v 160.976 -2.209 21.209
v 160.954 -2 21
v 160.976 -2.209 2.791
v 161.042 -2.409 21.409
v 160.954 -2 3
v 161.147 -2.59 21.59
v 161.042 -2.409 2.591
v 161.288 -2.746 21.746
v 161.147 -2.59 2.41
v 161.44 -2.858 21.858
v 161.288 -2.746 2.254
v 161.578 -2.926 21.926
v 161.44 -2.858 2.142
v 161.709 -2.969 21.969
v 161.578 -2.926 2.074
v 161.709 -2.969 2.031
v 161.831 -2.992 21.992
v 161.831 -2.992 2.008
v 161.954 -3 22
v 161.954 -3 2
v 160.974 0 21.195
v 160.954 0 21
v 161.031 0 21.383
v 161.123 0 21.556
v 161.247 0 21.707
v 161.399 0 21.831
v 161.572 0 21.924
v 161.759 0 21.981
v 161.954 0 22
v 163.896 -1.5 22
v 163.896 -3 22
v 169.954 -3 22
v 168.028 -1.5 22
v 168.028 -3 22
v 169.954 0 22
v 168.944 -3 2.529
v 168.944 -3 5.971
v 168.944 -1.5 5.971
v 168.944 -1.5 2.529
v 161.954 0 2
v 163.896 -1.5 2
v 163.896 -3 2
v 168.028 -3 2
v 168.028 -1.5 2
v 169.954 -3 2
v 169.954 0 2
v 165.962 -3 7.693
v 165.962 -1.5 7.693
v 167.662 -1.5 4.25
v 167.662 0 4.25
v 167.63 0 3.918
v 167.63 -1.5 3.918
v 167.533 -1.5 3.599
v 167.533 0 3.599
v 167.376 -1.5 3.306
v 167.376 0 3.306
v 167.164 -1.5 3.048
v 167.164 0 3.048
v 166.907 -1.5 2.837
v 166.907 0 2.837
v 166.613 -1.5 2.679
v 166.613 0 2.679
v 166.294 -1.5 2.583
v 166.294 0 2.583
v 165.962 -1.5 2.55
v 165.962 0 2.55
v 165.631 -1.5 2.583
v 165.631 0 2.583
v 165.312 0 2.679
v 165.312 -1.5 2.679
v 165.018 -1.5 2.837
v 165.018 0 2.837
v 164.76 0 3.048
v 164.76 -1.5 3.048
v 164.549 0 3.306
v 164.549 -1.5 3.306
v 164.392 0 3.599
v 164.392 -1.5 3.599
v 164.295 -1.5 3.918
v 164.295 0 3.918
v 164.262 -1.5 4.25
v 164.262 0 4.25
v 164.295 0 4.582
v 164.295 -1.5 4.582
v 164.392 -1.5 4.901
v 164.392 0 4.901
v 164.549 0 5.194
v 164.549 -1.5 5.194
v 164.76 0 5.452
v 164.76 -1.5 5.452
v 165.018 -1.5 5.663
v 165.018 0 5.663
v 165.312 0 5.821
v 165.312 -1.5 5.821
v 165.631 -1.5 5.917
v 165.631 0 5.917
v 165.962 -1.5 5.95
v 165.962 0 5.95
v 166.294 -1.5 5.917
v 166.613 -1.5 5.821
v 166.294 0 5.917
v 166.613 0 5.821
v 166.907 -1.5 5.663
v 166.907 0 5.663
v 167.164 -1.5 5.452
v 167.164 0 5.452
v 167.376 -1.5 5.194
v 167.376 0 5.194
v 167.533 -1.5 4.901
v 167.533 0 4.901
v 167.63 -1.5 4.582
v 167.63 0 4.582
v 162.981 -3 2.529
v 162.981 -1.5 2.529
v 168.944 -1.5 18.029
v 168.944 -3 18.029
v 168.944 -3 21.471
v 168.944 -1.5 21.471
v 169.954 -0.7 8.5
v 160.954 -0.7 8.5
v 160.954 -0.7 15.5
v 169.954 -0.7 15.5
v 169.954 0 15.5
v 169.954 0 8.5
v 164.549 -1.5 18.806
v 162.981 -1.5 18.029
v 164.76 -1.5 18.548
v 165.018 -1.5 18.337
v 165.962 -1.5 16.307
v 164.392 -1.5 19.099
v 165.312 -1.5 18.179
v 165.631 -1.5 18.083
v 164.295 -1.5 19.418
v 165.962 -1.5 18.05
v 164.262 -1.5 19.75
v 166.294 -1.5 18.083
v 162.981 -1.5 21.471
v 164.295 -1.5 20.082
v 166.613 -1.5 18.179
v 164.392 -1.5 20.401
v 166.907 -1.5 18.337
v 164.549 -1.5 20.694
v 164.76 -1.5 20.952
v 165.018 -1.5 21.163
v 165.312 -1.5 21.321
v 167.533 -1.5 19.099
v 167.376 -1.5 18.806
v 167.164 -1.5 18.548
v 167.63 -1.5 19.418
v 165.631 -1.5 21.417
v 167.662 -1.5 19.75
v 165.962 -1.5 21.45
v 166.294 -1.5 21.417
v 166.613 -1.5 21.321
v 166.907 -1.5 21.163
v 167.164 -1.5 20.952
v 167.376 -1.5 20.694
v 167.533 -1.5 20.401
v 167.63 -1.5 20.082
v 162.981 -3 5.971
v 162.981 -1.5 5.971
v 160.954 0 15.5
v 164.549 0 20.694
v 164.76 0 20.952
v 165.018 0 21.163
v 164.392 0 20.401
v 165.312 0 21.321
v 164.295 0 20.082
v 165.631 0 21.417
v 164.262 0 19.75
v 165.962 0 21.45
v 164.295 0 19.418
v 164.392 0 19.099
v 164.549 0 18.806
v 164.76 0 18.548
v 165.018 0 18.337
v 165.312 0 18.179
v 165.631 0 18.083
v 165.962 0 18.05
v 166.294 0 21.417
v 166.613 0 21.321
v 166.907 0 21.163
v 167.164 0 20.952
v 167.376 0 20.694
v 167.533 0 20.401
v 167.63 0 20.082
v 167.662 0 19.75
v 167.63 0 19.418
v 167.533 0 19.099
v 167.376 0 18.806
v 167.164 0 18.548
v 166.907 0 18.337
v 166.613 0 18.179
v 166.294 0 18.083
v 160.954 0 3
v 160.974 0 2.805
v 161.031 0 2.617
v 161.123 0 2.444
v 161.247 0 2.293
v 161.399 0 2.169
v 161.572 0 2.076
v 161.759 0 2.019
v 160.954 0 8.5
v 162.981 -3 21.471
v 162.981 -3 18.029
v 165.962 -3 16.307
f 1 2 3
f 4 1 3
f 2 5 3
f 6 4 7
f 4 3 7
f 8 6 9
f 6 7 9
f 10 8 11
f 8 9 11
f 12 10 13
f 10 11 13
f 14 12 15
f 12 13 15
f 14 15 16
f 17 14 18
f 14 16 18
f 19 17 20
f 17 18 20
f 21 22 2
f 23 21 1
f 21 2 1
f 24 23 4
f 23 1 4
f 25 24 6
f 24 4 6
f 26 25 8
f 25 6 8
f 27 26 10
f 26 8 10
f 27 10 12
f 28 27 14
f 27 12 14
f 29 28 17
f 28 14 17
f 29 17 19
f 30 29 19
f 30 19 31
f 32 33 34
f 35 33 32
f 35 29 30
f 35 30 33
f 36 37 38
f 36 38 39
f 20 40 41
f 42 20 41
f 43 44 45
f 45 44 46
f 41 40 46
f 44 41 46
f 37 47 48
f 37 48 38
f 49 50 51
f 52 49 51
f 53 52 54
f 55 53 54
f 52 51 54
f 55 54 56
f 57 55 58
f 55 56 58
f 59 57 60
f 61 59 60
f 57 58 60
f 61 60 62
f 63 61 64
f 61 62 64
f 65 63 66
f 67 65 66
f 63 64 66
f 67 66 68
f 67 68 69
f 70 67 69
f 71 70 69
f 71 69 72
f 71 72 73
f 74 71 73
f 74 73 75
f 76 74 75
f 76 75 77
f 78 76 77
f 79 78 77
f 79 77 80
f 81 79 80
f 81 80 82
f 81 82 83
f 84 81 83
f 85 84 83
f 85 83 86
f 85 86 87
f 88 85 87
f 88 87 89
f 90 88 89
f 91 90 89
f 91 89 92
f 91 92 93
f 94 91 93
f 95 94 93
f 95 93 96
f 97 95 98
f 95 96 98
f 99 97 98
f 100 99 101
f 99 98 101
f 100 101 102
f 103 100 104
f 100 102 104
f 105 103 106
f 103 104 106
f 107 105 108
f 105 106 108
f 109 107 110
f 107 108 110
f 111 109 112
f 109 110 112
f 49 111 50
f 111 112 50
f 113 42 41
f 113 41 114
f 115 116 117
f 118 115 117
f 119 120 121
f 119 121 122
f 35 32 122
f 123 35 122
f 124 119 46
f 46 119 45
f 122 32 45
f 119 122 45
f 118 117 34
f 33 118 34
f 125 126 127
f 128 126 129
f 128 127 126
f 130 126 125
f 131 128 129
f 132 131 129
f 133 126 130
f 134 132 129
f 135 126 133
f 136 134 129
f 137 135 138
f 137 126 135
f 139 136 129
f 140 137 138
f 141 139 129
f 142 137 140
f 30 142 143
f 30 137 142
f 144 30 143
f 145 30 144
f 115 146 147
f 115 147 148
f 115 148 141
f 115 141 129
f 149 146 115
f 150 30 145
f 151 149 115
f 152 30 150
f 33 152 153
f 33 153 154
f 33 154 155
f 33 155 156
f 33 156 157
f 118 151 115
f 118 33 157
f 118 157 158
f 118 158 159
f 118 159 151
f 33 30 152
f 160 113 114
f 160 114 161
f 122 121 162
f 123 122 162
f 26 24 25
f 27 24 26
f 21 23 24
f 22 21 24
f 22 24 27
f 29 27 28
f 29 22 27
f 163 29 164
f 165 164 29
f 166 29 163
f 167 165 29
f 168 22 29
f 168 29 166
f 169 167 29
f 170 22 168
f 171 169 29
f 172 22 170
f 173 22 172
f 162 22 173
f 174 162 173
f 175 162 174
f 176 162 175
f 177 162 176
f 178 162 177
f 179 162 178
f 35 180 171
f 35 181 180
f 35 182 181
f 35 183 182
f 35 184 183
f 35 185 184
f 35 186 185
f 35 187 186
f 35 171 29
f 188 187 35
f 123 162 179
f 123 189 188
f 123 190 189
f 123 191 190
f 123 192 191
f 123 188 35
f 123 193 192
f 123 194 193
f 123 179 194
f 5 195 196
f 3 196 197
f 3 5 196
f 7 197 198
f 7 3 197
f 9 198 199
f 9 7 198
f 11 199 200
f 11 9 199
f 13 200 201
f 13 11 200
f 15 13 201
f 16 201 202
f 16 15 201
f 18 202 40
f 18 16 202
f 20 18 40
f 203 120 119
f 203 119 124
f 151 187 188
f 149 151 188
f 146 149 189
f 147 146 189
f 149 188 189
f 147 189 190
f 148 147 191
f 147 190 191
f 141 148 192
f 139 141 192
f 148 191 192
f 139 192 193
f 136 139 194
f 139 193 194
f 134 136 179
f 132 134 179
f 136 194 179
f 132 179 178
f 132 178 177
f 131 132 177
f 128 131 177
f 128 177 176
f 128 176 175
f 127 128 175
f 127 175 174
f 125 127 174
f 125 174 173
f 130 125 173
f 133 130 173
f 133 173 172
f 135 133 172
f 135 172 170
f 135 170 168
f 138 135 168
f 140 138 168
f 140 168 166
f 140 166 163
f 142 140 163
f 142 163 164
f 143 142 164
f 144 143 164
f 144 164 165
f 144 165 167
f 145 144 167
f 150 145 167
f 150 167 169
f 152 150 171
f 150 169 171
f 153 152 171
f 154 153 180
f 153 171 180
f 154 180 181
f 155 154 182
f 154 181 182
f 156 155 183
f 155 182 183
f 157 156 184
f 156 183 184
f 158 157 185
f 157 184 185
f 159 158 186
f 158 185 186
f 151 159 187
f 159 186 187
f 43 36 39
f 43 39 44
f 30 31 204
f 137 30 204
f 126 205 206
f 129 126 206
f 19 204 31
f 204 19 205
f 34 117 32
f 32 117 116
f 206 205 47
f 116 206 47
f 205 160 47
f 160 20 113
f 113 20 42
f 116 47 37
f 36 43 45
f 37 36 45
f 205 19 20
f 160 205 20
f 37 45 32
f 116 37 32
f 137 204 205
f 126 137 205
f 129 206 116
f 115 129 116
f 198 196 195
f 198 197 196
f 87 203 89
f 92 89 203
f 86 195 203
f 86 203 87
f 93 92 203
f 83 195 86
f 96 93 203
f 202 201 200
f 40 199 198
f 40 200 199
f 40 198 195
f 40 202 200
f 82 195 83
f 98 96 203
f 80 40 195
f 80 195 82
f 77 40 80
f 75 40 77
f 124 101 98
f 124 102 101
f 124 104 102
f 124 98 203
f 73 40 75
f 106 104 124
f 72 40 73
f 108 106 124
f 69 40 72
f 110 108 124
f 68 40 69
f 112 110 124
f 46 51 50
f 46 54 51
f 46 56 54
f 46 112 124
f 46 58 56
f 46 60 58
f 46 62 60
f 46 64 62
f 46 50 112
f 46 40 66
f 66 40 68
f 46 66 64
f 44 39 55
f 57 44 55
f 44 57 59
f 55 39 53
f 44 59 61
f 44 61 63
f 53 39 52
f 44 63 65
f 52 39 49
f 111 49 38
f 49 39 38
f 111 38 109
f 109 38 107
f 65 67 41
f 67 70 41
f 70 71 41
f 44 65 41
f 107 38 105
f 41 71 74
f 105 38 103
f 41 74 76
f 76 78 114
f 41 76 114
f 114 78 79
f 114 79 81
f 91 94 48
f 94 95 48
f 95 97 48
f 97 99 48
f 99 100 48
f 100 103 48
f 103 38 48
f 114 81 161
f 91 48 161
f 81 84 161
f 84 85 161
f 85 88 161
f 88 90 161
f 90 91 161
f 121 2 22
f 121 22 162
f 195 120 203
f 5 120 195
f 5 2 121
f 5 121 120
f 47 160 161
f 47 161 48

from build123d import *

# Parameters (mm, degrees)
CROQUIS1_W              = 9
CROQUIS1_H              = 20
CROQUIS1_R              = 1.7
SALIENTE_EXTRUIR1_DEPTH = 3
CORTAR_EXTRUIR2_DEPTH   = 1.5
CORTAR_EXTRUIR3_REACH   = 11
CROQUIS3_W              = 7
CROQUIS3_H              = 1
REDONDEO1_R             = 1
CROQUIS4_W              = 9
CROQUIS4_H              = 7
SALIENTE_EXTRUIR2_DEPTH = 0.3


with BuildPart() as part:
    # Croquis1 → Saliente-Extruir1 (new body)
    with BuildSketch(Plane(origin=(0, 0, 0), x_dir=(1, 0, 0), z_dir=(0, 1, 0))):
        with Locations((165.454426616, -12)):
            Rectangle(CROQUIS1_W, CROQUIS1_H)
        with Locations((165.962302832, -4.25)):
            Circle(CROQUIS1_R, mode=Mode.SUBTRACT)
        with Locations((165.962302832, -19.75)):
            Circle(CROQUIS1_R, mode=Mode.SUBTRACT)
    extrude(amount=-SALIENTE_EXTRUIR1_DEPTH)

    # Croquis2 → Cortar-Extruir2 (cut)
    with BuildSketch(Plane.XZ.offset(3)):
        Polygon((168.943819954, 21.471379713), (165.962302832, 23.192759426), (162.98078571, 21.471379713), (162.98078571, 18.028620287), (165.962302832, 16.307240574), (168.943819954, 18.028620287), align=None)
        Polygon((168.943819954, 5.971379713), (168.943819954, 2.528620287), (165.962302832, 0.807240574), (162.98078571, 2.528620287), (162.98078571, 5.971379713), (165.962302832, 7.692759426), align=None)
    extrude(amount=-CORTAR_EXTRUIR2_DEPTH, mode=Mode.SUBTRACT)

    # Croquis3 → Cortar-Extruir3 (cut, up to next)
    with BuildSketch(Plane.ZY.offset(-160.954426616), mode=Mode.PRIVATE) as cortar_extruir3_sk1:
        with Locations((12, -0.5)):
            Rectangle(CROQUIS3_W, CROQUIS3_H)
    cortar_extruir3_tool1 = extrude(cortar_extruir3_sk1.sketch, amount=-CORTAR_EXTRUIR3_REACH, mode=Mode.PRIVATE) & part.part
    add(cortar_extruir3_tool1.solids().sort_by_distance((160.954427, -0.5, 12))[0], mode=Mode.SUBTRACT)

    # Redondeo1
    redondeo1_edges = [part.edges().sort_by_distance(p)[0] for p in [
        (160.954426616, -3, 12),
        (160.954426616, -1.5, 2),
        (160.954426616, -1.5, 22),
    ]]
    fillet(redondeo1_edges, radius=REDONDEO1_R)

    # Croquis4 → Saliente-Extruir2 (add)
    with BuildSketch(Plane(origin=(0, -1, 0), x_dir=(1, 0, 0), z_dir=(0, 1, 0))):
        with Locations((165.454426616, -12)):
            Rectangle(CROQUIS4_W, CROQUIS4_H)
    extrude(amount=SALIENTE_EXTRUIR2_DEPTH)


solid = part.part
